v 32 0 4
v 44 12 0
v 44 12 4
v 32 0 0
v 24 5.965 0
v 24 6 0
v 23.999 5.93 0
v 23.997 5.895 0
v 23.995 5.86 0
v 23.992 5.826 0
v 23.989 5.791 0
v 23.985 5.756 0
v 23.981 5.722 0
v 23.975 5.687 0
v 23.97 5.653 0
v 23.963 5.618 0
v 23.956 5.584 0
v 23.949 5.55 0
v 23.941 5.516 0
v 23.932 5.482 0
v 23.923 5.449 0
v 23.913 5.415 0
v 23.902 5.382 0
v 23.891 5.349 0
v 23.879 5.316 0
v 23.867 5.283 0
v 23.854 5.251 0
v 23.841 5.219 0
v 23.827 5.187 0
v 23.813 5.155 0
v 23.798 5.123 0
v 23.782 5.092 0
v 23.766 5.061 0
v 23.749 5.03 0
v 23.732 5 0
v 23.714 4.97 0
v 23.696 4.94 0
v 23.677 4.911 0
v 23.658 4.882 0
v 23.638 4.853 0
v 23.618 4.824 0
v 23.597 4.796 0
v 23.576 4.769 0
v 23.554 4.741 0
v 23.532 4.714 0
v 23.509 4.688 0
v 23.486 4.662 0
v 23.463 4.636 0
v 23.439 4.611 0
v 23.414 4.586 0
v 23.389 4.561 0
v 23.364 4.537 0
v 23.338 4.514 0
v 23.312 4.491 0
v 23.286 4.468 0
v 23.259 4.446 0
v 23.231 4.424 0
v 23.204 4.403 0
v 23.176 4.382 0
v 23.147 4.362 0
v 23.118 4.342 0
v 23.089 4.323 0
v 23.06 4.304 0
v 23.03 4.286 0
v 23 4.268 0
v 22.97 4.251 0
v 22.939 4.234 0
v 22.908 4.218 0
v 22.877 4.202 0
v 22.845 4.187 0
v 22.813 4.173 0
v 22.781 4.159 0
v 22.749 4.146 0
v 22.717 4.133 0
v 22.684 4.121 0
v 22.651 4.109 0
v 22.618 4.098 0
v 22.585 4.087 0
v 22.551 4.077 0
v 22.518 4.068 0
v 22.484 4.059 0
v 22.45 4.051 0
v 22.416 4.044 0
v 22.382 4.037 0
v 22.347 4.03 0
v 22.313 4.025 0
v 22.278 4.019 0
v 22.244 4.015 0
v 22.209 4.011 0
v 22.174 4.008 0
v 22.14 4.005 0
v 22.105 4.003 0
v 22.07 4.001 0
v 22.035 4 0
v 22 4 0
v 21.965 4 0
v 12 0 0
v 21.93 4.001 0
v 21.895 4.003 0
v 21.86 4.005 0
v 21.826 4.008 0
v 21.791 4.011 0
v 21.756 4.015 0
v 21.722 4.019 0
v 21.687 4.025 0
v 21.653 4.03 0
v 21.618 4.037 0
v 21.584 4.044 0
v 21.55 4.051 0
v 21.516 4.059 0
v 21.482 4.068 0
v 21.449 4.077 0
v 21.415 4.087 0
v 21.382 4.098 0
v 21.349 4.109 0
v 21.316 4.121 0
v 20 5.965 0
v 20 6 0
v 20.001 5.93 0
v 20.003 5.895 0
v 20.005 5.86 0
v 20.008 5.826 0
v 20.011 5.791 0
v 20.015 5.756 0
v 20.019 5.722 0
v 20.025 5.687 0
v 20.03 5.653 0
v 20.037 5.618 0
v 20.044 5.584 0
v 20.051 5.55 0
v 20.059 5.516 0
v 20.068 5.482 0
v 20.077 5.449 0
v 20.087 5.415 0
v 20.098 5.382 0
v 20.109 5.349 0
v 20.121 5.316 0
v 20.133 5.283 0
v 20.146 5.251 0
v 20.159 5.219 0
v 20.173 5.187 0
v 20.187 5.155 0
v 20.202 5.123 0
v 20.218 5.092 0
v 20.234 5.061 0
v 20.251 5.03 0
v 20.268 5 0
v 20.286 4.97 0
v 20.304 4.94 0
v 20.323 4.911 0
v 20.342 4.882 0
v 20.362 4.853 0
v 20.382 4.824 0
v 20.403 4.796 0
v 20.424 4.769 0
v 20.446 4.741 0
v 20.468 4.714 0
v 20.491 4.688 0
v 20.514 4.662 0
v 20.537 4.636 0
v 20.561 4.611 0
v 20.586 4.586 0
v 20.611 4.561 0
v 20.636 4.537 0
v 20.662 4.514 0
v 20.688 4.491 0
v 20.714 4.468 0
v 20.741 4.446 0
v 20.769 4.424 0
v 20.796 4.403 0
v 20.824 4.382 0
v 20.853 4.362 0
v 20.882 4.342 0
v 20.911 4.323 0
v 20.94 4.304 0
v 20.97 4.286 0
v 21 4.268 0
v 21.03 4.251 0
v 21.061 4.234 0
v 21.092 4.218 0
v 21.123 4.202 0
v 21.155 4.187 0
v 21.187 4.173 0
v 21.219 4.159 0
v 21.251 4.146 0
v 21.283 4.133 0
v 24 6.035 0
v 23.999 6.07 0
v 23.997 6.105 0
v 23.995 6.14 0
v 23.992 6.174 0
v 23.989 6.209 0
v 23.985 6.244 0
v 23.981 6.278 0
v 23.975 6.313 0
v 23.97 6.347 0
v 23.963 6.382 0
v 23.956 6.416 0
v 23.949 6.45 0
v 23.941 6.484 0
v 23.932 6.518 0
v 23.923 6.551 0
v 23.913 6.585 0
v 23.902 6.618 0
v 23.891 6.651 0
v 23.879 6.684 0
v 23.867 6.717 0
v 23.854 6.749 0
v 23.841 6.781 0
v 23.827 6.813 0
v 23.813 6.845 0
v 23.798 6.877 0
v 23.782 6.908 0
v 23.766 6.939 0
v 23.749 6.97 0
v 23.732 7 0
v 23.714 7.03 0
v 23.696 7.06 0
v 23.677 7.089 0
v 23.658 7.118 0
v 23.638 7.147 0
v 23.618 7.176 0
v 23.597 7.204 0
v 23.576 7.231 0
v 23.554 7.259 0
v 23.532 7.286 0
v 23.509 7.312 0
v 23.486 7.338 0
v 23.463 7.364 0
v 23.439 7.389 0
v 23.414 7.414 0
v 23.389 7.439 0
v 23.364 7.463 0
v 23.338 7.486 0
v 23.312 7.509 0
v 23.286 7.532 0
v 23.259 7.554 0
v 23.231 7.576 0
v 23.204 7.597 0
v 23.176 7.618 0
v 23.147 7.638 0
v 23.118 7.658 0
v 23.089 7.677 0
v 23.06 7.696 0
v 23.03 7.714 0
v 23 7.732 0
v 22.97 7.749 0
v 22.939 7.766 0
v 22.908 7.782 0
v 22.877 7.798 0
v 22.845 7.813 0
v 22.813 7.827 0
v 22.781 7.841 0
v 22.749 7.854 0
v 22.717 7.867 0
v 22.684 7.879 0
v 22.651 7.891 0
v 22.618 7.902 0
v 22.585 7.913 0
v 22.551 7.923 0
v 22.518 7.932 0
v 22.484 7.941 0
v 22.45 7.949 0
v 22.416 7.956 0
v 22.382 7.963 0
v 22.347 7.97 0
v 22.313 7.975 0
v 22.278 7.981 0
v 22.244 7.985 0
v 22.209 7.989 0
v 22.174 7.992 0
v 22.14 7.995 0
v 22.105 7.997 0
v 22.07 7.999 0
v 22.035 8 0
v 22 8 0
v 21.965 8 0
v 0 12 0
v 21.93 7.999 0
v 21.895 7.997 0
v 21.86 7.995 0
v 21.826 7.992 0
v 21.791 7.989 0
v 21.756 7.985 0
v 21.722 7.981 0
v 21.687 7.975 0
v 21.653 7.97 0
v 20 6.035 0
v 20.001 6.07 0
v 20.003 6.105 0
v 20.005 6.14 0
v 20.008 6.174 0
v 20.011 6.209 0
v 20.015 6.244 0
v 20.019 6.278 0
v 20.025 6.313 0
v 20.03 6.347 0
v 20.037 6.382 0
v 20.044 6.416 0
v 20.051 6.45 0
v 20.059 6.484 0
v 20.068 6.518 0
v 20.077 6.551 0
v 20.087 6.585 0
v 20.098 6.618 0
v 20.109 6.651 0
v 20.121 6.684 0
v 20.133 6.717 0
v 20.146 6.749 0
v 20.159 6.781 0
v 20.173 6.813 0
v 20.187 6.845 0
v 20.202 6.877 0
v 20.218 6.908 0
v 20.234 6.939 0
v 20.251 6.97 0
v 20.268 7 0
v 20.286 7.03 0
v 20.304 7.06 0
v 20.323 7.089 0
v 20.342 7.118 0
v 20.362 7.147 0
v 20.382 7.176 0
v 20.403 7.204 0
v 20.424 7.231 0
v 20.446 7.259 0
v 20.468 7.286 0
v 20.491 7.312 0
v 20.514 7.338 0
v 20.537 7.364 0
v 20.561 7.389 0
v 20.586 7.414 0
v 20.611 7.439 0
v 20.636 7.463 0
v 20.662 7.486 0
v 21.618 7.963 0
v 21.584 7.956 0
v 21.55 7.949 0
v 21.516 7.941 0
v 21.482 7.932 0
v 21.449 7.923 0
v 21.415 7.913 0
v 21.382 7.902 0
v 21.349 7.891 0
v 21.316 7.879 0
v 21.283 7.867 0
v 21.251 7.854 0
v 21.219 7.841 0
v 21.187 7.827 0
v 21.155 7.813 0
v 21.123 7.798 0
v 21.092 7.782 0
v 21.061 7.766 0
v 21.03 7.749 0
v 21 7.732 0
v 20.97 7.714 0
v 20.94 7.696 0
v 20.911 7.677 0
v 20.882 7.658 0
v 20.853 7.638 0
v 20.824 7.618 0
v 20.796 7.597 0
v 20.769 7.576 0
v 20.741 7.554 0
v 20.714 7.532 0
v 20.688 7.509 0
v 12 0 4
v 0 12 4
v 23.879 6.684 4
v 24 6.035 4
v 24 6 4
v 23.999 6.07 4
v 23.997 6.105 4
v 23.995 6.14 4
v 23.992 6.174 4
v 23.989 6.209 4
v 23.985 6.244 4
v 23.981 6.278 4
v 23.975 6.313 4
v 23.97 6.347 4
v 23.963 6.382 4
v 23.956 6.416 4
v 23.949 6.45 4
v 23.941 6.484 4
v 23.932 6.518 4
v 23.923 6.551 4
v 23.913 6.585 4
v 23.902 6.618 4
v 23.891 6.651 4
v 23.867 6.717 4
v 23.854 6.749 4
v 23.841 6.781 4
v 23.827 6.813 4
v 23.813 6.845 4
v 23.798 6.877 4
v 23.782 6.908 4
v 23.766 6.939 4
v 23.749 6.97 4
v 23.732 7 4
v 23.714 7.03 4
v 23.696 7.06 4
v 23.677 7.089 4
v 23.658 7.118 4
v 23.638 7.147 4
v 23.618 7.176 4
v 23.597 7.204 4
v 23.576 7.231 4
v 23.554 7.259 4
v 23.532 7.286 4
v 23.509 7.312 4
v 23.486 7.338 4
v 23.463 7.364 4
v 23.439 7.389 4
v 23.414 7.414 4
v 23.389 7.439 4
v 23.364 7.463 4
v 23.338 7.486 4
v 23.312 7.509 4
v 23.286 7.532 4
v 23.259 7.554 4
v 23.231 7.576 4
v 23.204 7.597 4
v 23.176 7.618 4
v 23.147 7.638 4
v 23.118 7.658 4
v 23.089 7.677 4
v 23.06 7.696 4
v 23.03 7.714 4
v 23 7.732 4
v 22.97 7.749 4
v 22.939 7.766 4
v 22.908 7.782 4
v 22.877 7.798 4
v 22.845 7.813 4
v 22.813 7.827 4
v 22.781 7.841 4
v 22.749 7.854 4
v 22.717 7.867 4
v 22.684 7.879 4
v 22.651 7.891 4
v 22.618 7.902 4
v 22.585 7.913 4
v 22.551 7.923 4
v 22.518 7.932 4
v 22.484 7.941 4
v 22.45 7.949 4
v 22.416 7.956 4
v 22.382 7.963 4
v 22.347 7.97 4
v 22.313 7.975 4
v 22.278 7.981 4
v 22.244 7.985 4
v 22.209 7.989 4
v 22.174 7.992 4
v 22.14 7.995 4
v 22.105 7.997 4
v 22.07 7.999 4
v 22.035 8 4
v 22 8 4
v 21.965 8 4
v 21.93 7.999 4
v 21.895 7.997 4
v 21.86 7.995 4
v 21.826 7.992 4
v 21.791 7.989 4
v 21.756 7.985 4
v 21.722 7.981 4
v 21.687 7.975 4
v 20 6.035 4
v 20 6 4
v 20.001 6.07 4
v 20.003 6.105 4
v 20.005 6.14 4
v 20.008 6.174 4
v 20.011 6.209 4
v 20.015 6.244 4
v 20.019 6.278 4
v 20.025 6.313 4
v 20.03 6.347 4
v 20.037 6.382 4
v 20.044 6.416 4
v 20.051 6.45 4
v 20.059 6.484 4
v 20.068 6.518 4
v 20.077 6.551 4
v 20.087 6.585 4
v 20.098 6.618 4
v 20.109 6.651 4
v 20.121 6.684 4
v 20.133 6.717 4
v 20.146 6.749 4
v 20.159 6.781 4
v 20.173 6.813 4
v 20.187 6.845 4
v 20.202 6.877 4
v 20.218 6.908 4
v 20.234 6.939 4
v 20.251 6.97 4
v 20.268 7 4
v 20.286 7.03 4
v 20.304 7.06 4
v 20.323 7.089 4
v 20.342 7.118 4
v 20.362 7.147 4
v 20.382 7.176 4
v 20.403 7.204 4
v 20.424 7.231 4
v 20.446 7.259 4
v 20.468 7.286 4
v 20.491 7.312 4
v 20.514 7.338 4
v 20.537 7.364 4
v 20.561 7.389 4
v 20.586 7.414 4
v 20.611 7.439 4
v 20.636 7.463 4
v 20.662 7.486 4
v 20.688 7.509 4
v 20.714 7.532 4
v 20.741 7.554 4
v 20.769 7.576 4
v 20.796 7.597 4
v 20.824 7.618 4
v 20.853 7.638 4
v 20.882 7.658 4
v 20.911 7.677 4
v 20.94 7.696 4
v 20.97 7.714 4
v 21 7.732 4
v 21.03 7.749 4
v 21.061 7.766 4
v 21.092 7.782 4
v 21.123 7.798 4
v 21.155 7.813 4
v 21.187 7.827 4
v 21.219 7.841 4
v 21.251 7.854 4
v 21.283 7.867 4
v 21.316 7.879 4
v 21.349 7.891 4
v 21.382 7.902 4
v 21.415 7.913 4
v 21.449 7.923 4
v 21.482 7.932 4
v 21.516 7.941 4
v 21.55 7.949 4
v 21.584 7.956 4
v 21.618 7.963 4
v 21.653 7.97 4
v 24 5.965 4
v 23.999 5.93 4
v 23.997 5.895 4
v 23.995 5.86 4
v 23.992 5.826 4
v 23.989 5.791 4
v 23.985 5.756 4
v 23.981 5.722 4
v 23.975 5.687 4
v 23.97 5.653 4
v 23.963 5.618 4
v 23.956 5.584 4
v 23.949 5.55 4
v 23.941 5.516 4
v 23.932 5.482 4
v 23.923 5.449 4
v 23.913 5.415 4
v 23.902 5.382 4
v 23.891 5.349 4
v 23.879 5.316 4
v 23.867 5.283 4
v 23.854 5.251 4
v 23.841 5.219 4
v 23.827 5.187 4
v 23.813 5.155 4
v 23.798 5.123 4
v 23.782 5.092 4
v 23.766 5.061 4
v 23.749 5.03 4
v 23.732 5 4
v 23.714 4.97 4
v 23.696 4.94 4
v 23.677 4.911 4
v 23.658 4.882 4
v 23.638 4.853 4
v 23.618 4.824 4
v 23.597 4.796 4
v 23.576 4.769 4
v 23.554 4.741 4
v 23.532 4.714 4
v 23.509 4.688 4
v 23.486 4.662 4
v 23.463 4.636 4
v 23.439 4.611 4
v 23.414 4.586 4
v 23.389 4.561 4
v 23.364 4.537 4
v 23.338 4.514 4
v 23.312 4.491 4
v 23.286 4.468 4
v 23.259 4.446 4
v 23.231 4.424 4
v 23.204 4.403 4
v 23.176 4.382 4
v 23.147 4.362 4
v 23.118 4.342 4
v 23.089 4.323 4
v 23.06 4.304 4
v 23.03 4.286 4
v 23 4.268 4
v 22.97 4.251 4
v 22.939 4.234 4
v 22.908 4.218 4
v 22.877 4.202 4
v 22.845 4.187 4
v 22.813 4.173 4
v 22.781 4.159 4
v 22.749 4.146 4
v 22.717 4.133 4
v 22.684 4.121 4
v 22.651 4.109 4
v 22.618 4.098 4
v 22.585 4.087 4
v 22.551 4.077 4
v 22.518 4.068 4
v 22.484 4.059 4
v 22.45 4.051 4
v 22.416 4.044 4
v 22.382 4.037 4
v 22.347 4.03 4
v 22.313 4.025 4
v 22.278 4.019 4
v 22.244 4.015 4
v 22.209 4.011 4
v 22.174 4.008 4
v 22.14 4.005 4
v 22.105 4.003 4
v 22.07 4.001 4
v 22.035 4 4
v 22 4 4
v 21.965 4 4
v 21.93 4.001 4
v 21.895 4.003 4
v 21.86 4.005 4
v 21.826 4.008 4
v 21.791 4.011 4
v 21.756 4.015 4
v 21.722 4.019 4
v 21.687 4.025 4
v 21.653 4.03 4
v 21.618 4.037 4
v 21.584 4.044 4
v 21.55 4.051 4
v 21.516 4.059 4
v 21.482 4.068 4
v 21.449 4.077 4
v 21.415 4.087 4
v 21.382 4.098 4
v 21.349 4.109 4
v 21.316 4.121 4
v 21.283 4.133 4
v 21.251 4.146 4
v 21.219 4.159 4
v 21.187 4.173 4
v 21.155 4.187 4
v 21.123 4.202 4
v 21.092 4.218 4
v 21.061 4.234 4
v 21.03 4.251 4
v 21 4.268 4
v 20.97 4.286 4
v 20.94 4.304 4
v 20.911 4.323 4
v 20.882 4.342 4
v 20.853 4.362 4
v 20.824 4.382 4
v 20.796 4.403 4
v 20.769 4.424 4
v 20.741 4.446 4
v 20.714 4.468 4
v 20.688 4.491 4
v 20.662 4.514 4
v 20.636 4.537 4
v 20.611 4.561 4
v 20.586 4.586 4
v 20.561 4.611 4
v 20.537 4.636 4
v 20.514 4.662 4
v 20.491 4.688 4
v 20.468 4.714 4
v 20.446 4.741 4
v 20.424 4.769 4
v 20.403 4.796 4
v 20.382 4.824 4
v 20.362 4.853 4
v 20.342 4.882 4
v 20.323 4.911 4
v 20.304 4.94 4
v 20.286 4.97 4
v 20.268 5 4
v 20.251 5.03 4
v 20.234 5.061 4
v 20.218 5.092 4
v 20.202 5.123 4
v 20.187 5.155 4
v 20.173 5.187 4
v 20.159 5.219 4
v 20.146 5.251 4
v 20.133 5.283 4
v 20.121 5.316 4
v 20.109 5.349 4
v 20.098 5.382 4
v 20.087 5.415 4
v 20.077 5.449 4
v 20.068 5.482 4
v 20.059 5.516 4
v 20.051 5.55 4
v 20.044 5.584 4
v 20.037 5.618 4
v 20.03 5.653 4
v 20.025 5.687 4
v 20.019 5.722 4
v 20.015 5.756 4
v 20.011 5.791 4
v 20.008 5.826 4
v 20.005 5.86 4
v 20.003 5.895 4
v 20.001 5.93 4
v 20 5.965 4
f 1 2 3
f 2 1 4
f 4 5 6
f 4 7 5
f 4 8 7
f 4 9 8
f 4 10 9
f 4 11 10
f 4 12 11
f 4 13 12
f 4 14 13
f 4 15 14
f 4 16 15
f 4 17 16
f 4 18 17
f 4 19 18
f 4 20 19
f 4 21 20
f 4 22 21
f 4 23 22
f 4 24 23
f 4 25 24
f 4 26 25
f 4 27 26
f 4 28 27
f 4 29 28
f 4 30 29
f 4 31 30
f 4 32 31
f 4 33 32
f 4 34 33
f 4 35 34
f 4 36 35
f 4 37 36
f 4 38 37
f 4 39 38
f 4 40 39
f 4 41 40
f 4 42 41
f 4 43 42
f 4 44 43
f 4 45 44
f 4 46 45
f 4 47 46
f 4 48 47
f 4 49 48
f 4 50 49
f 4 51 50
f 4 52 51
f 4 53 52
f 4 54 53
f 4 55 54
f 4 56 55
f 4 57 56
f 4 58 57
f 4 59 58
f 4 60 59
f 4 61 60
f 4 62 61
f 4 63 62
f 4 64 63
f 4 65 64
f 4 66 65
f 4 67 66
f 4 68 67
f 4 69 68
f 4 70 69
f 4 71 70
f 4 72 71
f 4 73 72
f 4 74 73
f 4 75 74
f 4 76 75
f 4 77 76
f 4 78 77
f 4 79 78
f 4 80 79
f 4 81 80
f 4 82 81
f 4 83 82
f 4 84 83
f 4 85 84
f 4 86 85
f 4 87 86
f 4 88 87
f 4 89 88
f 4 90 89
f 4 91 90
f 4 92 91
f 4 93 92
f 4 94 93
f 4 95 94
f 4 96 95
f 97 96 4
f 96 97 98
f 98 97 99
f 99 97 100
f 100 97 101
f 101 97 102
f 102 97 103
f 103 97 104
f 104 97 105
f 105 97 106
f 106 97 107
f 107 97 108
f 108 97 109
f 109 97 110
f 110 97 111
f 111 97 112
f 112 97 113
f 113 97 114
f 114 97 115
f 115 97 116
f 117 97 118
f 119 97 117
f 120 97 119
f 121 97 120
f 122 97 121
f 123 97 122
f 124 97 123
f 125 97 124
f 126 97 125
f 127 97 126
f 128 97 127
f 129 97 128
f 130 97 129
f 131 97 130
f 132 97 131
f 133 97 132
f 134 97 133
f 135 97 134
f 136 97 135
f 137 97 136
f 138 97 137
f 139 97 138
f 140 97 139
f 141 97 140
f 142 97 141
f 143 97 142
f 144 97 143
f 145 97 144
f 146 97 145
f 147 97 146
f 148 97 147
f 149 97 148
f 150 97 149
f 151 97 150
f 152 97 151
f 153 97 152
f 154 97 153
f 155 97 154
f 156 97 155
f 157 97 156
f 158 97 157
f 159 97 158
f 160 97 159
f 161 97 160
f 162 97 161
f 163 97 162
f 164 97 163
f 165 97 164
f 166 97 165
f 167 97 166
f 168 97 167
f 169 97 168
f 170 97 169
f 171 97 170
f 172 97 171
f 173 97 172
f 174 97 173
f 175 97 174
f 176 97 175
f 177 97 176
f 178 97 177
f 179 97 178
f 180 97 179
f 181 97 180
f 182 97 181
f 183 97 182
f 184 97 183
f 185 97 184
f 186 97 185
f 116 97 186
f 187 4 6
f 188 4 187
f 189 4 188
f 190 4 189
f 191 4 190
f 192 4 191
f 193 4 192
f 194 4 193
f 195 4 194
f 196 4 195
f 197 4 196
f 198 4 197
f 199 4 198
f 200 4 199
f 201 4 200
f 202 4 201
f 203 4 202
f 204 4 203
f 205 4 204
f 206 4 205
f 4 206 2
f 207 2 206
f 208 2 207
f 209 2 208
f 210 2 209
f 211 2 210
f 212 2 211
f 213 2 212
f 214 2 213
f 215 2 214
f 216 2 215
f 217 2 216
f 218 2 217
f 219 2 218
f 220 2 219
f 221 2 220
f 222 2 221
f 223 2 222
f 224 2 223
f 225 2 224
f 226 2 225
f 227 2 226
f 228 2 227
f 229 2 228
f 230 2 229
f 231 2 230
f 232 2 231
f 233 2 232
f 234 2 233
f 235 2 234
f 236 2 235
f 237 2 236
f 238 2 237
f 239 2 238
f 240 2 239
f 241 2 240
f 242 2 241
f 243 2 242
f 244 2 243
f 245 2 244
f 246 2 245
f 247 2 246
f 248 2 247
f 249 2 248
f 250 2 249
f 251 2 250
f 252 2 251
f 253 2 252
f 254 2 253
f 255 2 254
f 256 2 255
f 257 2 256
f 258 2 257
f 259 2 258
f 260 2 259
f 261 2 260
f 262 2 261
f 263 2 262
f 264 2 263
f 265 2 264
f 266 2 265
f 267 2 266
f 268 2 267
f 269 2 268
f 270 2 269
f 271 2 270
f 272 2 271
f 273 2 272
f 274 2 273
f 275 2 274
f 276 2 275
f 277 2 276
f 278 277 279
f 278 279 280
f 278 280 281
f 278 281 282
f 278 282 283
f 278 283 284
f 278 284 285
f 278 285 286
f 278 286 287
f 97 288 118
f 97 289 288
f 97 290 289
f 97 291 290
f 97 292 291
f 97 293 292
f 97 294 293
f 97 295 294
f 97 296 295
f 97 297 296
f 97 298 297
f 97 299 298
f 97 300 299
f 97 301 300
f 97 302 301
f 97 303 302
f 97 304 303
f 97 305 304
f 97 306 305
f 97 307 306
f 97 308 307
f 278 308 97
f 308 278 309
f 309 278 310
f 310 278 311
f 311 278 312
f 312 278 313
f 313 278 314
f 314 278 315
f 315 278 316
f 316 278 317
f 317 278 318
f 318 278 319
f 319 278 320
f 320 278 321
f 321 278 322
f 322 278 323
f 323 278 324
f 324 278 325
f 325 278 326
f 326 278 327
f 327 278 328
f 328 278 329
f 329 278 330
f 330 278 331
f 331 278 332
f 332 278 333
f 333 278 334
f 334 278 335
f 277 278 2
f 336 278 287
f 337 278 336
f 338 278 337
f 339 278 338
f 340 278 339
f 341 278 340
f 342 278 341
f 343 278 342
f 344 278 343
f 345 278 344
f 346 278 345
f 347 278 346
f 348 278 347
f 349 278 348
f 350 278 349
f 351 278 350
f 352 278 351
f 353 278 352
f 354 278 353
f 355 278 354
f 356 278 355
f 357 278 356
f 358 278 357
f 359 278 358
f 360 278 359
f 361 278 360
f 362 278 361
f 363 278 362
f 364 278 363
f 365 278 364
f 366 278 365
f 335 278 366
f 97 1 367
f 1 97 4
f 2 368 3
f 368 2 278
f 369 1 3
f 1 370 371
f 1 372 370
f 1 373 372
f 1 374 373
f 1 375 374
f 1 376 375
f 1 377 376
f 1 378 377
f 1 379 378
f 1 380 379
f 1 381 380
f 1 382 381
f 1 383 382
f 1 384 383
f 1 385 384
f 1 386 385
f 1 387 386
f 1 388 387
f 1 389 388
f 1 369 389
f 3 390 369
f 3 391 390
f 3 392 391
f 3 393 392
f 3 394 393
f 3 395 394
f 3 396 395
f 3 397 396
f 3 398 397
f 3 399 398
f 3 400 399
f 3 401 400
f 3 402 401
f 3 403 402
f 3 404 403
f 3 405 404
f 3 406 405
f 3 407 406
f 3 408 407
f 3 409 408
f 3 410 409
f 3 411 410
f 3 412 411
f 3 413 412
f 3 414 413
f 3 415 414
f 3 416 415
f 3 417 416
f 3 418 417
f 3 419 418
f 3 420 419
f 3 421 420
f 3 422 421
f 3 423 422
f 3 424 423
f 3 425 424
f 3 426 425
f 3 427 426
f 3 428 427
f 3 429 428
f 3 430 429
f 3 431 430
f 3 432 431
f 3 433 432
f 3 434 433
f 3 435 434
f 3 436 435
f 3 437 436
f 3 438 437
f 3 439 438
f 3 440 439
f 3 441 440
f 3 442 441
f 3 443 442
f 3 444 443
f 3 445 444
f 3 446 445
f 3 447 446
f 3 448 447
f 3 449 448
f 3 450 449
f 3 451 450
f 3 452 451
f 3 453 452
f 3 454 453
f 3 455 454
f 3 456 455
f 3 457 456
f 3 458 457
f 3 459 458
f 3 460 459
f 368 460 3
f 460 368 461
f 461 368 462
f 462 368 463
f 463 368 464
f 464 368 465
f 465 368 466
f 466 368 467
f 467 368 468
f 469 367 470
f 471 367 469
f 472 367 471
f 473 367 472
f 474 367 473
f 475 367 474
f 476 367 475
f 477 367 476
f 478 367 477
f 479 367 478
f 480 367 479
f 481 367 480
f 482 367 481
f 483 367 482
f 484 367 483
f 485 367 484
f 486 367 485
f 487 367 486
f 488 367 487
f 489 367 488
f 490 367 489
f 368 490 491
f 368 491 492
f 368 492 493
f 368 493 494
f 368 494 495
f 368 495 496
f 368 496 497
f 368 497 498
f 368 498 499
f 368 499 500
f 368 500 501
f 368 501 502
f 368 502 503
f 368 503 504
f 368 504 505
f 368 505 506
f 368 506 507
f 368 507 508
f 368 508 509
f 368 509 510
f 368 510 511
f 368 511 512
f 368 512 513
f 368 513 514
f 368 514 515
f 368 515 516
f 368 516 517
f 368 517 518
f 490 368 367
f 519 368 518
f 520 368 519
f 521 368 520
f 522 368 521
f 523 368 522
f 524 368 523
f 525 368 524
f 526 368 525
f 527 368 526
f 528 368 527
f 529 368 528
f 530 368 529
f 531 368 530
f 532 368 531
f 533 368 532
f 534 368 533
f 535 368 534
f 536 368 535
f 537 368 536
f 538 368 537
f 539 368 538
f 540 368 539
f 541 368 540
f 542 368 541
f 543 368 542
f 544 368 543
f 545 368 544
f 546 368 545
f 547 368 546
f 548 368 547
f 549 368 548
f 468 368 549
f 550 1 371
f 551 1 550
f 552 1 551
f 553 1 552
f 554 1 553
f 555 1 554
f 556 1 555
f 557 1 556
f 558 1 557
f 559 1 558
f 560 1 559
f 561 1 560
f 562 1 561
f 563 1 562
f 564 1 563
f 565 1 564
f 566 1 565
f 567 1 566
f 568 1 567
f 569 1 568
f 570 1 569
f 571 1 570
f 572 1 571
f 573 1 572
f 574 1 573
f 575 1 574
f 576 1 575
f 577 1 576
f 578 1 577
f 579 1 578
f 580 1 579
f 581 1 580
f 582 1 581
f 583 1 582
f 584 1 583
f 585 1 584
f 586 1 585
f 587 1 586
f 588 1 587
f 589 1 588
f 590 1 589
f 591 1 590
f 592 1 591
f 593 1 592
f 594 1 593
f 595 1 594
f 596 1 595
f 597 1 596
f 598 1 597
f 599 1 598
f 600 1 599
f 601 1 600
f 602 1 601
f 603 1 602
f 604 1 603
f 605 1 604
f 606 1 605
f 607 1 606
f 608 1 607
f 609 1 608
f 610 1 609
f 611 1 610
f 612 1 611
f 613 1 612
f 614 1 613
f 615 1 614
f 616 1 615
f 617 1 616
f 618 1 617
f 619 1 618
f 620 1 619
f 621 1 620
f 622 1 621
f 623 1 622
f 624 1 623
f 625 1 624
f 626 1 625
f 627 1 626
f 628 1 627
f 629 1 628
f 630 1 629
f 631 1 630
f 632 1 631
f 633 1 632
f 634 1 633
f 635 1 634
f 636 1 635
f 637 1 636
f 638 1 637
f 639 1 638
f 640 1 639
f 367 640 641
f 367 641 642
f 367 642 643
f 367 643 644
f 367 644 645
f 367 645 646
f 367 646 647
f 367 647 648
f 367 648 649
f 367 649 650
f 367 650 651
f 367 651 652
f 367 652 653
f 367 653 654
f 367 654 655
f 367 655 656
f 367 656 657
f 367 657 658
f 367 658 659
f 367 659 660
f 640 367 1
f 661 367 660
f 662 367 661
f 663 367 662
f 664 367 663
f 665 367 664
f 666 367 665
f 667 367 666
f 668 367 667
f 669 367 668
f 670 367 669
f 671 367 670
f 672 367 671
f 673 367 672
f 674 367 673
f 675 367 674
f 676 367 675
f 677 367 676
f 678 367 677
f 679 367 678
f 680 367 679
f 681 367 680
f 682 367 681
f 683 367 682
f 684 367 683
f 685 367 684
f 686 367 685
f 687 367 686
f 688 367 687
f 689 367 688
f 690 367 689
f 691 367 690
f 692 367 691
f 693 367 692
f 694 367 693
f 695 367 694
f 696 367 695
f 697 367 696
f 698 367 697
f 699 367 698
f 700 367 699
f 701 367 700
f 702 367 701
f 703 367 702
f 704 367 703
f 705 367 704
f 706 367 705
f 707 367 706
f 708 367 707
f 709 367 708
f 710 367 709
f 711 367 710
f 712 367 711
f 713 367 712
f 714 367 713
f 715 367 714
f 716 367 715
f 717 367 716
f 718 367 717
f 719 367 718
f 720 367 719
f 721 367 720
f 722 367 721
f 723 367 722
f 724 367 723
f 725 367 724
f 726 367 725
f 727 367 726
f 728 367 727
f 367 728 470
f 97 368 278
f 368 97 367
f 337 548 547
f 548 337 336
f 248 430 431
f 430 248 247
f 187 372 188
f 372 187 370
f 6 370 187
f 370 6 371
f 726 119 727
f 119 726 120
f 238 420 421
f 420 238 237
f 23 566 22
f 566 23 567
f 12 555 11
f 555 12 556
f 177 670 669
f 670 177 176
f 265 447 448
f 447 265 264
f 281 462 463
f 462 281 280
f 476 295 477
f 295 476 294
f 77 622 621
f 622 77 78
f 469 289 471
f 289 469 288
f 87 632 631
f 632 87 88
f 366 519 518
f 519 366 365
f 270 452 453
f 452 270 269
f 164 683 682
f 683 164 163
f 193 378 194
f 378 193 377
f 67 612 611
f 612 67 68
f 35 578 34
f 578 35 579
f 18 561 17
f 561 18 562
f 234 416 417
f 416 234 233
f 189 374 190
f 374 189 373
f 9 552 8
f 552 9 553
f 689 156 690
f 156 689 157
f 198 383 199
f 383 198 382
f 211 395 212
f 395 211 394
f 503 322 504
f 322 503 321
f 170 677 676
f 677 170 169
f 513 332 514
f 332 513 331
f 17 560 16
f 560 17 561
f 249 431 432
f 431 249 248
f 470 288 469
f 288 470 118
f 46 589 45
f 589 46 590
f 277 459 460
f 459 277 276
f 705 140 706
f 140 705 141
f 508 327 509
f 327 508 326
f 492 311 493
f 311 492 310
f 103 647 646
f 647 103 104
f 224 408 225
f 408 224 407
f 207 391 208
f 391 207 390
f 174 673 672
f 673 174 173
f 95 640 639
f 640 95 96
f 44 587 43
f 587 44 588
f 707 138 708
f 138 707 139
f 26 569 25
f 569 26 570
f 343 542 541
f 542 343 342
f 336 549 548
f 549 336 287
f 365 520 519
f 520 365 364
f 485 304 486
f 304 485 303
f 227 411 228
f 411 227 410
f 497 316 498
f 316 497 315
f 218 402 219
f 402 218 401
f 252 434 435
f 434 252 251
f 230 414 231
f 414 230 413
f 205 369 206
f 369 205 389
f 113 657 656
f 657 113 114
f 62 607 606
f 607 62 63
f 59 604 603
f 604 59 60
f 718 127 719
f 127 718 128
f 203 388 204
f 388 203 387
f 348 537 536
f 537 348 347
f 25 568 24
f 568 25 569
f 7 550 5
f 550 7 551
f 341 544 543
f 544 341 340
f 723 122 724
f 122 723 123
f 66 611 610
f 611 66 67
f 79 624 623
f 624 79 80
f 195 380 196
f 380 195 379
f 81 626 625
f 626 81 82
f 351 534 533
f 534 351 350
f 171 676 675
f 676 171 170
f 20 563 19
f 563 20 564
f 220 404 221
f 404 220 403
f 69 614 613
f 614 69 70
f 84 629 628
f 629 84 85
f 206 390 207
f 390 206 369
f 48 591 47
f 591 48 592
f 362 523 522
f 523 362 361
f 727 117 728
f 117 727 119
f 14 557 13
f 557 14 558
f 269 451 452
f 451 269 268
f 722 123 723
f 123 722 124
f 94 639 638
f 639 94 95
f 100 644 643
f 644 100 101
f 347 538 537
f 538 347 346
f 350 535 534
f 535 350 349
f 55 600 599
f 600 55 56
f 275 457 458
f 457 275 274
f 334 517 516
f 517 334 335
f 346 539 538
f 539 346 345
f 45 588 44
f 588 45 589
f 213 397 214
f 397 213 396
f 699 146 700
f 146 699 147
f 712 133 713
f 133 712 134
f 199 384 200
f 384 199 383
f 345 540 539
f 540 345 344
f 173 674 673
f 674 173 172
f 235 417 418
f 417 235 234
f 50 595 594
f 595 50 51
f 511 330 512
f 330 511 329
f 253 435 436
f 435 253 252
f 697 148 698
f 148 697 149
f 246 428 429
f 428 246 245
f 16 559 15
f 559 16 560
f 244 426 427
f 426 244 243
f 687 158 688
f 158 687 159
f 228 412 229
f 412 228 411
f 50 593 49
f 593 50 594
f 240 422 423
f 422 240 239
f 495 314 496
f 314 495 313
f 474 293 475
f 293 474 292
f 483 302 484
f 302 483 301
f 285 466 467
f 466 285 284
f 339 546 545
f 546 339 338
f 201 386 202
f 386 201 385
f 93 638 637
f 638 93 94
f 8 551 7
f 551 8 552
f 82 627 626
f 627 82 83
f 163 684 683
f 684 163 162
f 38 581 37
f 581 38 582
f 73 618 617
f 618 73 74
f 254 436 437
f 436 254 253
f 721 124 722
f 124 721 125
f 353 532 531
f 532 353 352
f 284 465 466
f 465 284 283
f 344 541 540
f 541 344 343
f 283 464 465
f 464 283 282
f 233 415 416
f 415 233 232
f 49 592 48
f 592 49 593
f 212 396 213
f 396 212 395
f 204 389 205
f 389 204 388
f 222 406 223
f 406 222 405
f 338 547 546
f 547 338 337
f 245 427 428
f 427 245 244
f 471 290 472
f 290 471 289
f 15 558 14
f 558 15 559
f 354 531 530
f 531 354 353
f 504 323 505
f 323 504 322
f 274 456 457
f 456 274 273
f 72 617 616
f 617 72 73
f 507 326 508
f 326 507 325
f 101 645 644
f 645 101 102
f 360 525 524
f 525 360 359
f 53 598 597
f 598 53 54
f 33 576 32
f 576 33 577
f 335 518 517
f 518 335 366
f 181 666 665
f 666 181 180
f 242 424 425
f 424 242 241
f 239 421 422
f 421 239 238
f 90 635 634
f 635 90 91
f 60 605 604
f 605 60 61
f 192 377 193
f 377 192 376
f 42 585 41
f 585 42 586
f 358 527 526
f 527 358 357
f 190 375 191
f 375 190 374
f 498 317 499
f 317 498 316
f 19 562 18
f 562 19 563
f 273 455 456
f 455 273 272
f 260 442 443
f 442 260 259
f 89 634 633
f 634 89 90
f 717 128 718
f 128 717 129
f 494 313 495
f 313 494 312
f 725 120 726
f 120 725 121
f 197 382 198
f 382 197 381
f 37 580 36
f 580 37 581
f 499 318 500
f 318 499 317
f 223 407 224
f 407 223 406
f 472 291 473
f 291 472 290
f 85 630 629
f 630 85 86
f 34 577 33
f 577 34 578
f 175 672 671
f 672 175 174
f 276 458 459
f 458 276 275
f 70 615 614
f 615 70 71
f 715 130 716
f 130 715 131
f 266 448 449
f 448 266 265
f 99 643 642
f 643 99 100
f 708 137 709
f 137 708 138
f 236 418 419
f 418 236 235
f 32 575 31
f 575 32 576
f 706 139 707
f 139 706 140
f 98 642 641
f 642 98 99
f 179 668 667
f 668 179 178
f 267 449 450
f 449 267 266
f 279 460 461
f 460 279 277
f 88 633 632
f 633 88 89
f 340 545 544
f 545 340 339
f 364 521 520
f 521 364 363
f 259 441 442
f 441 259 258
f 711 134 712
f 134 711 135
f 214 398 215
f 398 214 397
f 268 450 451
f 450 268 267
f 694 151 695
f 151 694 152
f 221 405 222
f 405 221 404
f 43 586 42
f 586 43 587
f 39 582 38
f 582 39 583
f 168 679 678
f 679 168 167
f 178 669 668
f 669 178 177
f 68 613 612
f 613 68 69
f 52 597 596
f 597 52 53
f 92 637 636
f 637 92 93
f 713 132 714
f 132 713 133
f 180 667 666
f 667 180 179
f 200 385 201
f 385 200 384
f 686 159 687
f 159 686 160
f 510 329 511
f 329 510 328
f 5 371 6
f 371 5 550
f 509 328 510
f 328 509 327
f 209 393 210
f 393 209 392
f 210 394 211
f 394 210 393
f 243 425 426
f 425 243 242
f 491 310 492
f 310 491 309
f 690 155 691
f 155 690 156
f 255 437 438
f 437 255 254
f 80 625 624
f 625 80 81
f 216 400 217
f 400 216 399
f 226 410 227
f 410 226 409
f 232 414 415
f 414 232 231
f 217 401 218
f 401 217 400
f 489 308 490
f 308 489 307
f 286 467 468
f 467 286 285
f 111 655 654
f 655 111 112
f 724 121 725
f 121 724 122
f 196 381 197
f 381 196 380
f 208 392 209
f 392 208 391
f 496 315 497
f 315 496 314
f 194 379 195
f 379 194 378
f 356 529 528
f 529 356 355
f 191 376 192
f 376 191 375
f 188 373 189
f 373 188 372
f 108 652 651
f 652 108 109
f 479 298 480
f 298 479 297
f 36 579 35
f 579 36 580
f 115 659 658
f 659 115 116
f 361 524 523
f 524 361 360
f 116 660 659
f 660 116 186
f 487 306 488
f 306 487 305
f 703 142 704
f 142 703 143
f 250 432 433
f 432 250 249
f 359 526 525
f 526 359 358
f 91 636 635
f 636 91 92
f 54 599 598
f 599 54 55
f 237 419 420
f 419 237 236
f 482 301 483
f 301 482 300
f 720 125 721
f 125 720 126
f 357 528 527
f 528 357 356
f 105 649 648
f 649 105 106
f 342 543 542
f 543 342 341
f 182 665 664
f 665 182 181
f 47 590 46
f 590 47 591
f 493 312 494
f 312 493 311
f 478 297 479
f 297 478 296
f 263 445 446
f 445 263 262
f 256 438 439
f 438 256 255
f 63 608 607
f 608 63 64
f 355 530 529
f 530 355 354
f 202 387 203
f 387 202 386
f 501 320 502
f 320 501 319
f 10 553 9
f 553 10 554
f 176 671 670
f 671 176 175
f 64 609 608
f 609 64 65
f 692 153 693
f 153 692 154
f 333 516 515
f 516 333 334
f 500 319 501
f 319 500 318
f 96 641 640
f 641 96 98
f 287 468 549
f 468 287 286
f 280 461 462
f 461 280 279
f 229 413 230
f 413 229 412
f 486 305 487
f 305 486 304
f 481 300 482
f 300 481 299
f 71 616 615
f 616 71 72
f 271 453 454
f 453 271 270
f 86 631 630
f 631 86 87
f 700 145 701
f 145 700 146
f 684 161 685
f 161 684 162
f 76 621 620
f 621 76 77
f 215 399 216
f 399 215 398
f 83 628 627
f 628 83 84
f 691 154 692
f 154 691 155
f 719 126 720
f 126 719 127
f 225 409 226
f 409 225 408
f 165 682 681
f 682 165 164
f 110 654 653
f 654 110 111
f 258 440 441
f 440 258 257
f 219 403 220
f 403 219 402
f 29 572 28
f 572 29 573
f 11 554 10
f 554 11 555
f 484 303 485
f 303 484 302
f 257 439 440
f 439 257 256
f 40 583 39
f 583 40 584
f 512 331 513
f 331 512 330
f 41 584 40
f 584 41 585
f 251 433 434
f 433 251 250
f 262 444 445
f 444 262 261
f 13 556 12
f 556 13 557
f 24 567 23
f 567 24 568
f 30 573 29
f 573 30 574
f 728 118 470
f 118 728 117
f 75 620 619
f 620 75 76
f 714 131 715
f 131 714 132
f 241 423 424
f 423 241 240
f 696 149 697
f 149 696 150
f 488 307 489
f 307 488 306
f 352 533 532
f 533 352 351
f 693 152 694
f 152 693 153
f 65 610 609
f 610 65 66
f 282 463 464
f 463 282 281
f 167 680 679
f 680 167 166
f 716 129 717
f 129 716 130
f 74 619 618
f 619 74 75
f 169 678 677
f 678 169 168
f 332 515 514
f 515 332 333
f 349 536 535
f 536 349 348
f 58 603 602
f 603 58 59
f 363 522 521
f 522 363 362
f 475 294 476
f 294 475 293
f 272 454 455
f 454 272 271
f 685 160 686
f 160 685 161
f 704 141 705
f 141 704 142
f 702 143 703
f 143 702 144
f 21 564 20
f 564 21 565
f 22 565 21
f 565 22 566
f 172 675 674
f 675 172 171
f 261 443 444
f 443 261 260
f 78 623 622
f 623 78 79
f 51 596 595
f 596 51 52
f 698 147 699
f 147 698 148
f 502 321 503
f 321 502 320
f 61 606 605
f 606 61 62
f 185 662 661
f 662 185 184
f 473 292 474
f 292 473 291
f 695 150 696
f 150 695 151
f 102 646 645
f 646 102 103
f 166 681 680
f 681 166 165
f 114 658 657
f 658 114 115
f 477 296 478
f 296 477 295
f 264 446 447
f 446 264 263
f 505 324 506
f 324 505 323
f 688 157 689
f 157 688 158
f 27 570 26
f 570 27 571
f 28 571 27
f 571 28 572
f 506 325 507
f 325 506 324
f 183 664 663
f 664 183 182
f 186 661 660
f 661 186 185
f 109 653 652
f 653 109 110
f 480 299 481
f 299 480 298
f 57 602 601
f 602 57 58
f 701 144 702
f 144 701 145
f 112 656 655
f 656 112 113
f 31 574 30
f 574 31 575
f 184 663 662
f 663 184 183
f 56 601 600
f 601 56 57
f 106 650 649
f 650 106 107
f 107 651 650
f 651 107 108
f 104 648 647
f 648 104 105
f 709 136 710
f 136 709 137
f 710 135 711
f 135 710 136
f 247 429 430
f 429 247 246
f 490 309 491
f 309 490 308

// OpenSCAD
$fn = 360;

module holder() {
    width = 44;
    height = 12;
    thickness = 4;
    hole = 4;

    difference() {
        linear_extrude(height = thickness, center = false)
        polygon(points = [
            [height, 0],
            [width - height, 0],
            [width, height],
            [0, height]
        ], paths = [[0, 1, 2, 3]], convexity = 1);
    
        translate([width / 2, height / 2, -1])
        cylinder(h = thickness + 2, 
            r = hole / 2, center = false);
    }
}

holder();
